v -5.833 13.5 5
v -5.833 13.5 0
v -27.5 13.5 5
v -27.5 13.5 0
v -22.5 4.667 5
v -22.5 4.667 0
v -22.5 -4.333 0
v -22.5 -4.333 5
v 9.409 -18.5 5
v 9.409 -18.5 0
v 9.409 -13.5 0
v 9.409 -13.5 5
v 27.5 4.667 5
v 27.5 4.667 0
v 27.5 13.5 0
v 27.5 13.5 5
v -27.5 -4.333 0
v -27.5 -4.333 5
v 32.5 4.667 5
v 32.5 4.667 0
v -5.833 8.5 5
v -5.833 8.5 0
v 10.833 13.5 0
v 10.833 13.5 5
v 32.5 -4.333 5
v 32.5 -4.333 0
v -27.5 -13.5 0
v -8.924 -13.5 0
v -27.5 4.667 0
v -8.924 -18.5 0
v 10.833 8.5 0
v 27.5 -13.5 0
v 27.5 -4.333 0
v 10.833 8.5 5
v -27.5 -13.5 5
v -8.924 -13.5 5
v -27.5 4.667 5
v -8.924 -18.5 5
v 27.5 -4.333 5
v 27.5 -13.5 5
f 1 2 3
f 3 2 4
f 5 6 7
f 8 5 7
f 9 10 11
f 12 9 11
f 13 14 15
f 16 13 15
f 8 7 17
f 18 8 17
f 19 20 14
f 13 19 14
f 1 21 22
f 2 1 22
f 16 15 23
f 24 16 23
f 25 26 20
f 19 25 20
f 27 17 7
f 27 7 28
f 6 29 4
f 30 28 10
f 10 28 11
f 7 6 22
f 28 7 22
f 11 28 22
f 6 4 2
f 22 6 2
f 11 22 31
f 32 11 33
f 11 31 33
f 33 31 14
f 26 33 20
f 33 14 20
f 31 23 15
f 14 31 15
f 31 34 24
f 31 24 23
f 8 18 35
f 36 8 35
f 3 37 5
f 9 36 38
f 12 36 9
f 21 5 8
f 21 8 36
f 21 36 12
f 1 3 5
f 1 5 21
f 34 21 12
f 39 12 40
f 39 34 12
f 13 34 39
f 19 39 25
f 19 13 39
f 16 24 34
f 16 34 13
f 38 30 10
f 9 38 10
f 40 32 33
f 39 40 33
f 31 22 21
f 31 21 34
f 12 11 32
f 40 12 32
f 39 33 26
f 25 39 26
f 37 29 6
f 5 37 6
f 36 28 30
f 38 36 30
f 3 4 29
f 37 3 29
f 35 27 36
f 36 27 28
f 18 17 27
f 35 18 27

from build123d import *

# Parameters (mm, degrees)
BOSS_EXTRUDE1_DEPTH = 5
CAVITY1_START       = 8.5
CAVITY1_OUTLINE_W   = 16.666666666
CAVITY1_OUTLINE_H   = 5
CAVITY1_DEPTH       = 5


# Read off the part's stored shape, not the designer's step: Cavity1
with BuildPart() as part:
    # Sketch1 → Boss-Extrude1 (new body)
    with BuildSketch(Plane.XY):
        Polygon((27.5, 4.666666667), (27.5, 13.5), (-27.5, 13.5), (-27.5, 4.666666667), (-22.5, 4.666666667), (-22.5, -4.333333333), (-27.5, -4.333333333), (-27.5, -13.5), (-8.924137908, -13.5), (-8.924137908, -18.5), (9.409195426, -18.5), (9.409195426, -13.5), (27.5, -13.5), (27.5, -4.333333333), (32.5, -4.333333333), (32.5, 4.666666667), align=None)
    extrude(amount=BOSS_EXTRUDE1_DEPTH)

    # Cavity1 outline → Cavity1 (cut)
    with BuildSketch(Plane(origin=(0, 0, 0), x_dir=(1, 0, 0), z_dir=(0, 1, 0)).offset(CAVITY1_START)):
        with Locations((2.5, -2.5)):
            Rectangle(CAVITY1_OUTLINE_W, CAVITY1_OUTLINE_H)
    extrude(amount=CAVITY1_DEPTH, mode=Mode.SUBTRACT)


solid = part.part
